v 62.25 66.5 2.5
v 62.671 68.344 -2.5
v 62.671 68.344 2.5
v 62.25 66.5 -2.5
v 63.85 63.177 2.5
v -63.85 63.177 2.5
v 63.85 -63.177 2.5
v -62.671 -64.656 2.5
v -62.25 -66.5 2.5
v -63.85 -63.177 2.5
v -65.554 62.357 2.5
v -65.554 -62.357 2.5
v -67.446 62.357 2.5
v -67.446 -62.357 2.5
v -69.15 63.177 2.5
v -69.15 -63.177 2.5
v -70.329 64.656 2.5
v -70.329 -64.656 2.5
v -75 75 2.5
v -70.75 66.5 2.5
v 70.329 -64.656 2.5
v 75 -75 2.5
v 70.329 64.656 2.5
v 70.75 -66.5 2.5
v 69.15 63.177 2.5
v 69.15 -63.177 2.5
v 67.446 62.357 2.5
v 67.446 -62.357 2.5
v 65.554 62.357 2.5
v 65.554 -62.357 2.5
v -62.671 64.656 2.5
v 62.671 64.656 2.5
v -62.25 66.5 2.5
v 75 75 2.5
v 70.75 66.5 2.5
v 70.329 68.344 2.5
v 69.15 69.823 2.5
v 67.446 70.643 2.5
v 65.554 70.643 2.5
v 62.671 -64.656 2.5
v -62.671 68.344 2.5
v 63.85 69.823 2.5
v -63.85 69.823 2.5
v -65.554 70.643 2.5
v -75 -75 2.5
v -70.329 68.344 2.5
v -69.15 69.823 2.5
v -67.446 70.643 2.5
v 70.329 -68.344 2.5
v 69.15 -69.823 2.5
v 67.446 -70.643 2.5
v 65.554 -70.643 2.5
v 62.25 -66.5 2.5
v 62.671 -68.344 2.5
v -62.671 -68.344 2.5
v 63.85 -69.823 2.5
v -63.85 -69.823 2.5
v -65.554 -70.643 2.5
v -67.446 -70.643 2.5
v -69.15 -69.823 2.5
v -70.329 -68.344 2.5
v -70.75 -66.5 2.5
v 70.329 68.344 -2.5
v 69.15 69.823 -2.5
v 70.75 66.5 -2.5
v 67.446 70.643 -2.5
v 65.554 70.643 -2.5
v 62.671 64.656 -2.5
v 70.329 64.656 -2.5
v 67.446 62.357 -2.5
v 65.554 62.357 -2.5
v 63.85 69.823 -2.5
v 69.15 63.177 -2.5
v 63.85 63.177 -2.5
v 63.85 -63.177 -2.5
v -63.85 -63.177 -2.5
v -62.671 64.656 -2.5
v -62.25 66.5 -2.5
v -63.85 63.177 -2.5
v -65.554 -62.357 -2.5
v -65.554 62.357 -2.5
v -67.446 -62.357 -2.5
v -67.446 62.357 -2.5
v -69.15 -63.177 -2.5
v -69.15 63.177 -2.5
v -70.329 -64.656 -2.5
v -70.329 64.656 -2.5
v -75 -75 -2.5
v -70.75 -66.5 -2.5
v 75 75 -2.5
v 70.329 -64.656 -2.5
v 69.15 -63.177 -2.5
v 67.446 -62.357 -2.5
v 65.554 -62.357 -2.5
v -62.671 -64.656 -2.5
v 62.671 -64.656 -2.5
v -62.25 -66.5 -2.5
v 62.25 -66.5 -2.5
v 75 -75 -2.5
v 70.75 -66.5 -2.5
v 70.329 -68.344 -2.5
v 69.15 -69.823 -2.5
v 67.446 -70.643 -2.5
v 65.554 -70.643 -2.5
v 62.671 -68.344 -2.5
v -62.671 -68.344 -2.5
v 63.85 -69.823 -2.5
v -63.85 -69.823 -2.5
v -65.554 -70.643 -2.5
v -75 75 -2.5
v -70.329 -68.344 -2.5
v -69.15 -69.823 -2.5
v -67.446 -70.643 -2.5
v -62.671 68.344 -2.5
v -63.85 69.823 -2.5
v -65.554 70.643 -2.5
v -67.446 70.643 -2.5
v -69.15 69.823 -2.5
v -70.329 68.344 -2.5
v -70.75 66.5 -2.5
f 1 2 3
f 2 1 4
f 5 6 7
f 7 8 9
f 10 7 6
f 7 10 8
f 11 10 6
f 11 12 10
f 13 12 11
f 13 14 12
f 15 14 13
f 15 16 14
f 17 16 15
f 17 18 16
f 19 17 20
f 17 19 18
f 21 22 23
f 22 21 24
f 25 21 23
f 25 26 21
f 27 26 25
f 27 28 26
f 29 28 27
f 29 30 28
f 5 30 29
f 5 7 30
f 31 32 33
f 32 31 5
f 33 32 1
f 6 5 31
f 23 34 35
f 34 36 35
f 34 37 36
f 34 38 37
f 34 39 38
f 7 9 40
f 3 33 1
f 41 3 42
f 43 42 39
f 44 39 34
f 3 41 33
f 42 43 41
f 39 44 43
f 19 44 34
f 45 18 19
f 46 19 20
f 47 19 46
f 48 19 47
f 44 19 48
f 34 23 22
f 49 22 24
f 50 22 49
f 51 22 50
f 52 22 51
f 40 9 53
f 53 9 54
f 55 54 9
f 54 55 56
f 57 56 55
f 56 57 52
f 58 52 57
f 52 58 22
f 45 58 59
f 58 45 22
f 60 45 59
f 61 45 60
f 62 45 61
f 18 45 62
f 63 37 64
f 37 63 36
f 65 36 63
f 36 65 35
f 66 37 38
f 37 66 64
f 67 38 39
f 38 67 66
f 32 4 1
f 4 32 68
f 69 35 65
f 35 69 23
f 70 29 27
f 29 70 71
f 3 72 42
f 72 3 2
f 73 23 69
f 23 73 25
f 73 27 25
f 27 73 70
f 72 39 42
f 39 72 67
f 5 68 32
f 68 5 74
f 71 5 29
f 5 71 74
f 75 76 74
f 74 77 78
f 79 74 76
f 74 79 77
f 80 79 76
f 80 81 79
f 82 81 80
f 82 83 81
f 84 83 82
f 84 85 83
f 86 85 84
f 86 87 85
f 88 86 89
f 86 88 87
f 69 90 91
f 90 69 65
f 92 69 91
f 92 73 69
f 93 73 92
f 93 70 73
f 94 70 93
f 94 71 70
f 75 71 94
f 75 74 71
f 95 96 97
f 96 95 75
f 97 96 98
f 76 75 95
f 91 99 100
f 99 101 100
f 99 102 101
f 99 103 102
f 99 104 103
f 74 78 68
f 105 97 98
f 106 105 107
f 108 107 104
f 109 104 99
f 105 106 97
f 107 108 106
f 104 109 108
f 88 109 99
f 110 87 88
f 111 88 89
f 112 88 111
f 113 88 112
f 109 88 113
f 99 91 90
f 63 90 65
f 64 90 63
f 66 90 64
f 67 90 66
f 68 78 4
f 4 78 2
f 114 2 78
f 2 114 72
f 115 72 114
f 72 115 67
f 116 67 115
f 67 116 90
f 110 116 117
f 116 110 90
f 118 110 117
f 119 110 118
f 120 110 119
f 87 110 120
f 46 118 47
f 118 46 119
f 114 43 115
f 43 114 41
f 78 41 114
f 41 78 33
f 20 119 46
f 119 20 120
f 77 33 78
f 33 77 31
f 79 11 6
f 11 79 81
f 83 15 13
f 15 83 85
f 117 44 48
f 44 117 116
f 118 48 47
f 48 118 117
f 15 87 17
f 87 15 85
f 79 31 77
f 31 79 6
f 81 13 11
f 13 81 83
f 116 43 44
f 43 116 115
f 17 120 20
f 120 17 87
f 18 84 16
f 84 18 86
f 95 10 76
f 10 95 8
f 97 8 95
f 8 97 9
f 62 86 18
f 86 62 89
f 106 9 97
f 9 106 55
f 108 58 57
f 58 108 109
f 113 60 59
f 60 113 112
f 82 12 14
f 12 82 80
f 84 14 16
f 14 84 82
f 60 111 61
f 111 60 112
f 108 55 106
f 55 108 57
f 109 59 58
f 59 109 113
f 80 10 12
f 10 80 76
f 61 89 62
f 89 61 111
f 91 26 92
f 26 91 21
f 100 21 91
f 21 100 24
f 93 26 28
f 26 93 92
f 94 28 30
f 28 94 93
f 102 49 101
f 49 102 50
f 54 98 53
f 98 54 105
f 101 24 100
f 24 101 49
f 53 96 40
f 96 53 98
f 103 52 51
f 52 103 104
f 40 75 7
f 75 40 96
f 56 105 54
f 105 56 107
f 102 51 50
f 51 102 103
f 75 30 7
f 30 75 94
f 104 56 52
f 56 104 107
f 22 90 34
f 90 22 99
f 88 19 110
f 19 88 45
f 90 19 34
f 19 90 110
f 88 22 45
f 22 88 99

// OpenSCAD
// Generated by SolidPython 1.1.3 on 2024-01-11 20:37:03


difference() {
	cube(center = true, size = [150, 150, 5]);
	union() {
		translate(v = [66.5000000000, 66.5000000000]) {
			cylinder(center = true, h = 5, r = 4.2500000000);
		}
		translate(v = [-66.5000000000, 66.5000000000]) {
			cylinder(center = true, h = 5, r = 4.2500000000);
		}
		translate(v = [-66.5000000000, -66.5000000000]) {
			cylinder(center = true, h = 5, r = 4.2500000000);
		}
		translate(v = [66.5000000000, -66.5000000000]) {
			cylinder(center = true, h = 5, r = 4.2500000000);
		}
	}
}
/***********************************************
*********      SolidPython code:      **********
************************************************
 
import solid
import numpy as np
import numbers
import pudb
from solid.utils import *
import viewscad
import subprocess
import os
import os.path as osp
import math
import sys

chamfer_extrude=solid.import_scad("./chamfer_extrude.scad")
chamfer_extrude=chamfer_extrude.chamfer_extrude
r = viewscad.Renderer(width=800, height=800)

def debug(model,f_name,path="/home/ts/code/projects/mfd/designs/debug"):
    solid.scad_render_to_file(model,osp.join(path,f_name)+".scad")
#generate position list of wells using offset from center
wells_pos_from_center_4 = lambda offset: [[-offset,offset],
                                        [offset, offset],
                                        [-offset, -offset],
                                        [offset, -offset]]
wells_pos_from_center_2 = lambda offset: [[offset,0],
                                        [-offset,0]]

def make_well(dims,shape=None,height=None,dxf=False):
    def circle_cylinder():
        if dxf or (height is None):
            well = solid.circle(r=dims, segments=64)
        else:
            well = solid.cylinder(r=dims, h=height, segments=64, center = True)
        return well
    if dims is None:
        sys.exit("radius needs to be a number")
    if isinstance(dims, numbers.Number):
        well =circle_cylinder()
    elif len(dims)==1:
        if isinstance(dims[1], numbers.Number):
            well =circle_cylinder()
        else:
            sys.exit("radius needs to be a number")
    elif len(dims)==2:
        well = solid.square(dims,center = True)
    elif len(dims)==3:
        well = solid.cube(dims, center = True)
    return well

def wells_top_bottom(center_gap,device_dims=None,shape=None,height=None, positions = None, dxf = False,well_shape=None):
    if well_shape == None:
        well_shape = make_well(device_dims,shape=shape,height=height,dxf=dxf)
    wells = []
    if positions is None:
        offset = radius+radius/2.0
        positions = wells_pos_from_center_2(offset)
    if dxf or (height is None):
        height = 0
    for position in positions:
        if dxf:
            wells.append(solid.translate([position[0],position[1]])(well_shape))
        else:
            wells.append(solid.translate([position[0],position[1],height/2.0])(well_shape))
    return  union()(*wells)

#place wells in four corners 
def four_corner(radius,height=None, positions = None, dxf = False):
    #if well pos not specified set
    #to equally spaced by half radius
    if positions is None:
        offset = radius+radius/2.0
        positions = wells_pos_from_center_4(offset)
    if dxf or (height is None):
        height = 0
    #make wells at positions with specified radius and height
    wells = []
    for position in positions:
        #make circle if making dxf
        if dxf:
            well_shape = solid.circle(r=radius, segments=64)
            well_shape = solid.translate([position[0],position[1]])(well_shape)
        #if stl make cylinder
        else:
            well_shape = solid.cylinder(r=radius, h=height, segments=64, center = True)
            well_shape = solid.translate([position[0],position[1],height/2.0])(well_shape)
        wells.append(well_shape)
    return  union()(*wells)

#generate channels 
def make_channels(length,width,height=0,num_chans=1,max_chans=None,spacing=None, dxf = False,
                  rotate_channels=False):
    if dxf or (height is None):
        height = 0
    #if channel gap not defined, is equal to
    if spacing is None: spacing = width
    #calculate number of channels if fitting max num within given width
    if not max_chans is None:
        import math
        num_chans = math.floor((max_chans-spacing)/(width+spacing))
    #get total width of channel section  
    total_width = (width*num_chans)+(spacing*(num_chans-1))

    #make template channel
    #if rotate_channels: width, length = length, width
    if dxf:
        channel_t = solid.square([length,width],center = True)
    else:
        channel_t = solid.cube([length,width,height], center = True)

    #if number channels is even, offset the first channel to center its gap
    if num_chans % 2 == 0: centering = -(width/2.0+spacing/2.0)
    else: centering = 0
    #move template channel up to align bottom at z = 0 
    #and offset center if necessary
    if dxf:
        channel_t = solid.translate([0,centering])(channel_t)
    else:
        channel_t = solid.translate([0,centering,height/2.0])(channel_t)

    #if rotate_channels: length,width = width,length
    #start making the channels
    channels = []
    for i in range(num_chans):
        #if i=0 there is no translation
        #if i=1, we make the first channel adjacent to second
        direction = i

        #if i>=1, we add channels alternating left and right
        if i >= 1:
            direction = -(i/2.0)
            if i % 2 == 1: direction = (-direction)+0.5
                
        #make channel at right position and add it to channel list
        translation_coords = [0,direction*(width+spacing)]
        #if rotate_channels: translation_coords = [direction*(width+spacing),0]
        if dxf:
            channel = solid.translate(translation_coords)(channel_t)
        else:
            channel = solid.translate([*translation_coords,0])(channel_t)
        channels.append(channel)
    
    #group all channels as one object
    channels = union()(*channels)
    #compute the x,y,z dimensions in order to pass as arguments 
    #for construction of other parts of device (such as the chambers)
    measurements = {'x':(length/2.0,-length/2.0),
                    'y':(total_width/2.0,-total_width/2.0)}
    if not dxf:
        measurements['z'] = (height,0)
    if rotate_channels:
        channels = solid.rotate(90)(channels)
        measurements['x'],measurements['y']=measurements['y'],measurements['x']
    return channels,measurements

def make_chambers(msrs,height=None,extra=0,len_until=None,width=None, dxf = False):
    #computes x,y,z length
    total = lambda x : abs(x[0]) + abs(x[1])
    
    #if specific height if specified
    #otherwise use same height as channels
    if dxf:
        pass
    elif not height is None:
        msrs['z'] = (height,0)
    else:
        msrs['z'] = (0,0)
        
    #make copy of measurements from channels to modify chamber dimensions 
    #and add length to chambers as specified
    chamber_dims = msrs.copy()
    #calculate length of chamber to reach specified offset
    if not len_until is None:
        chamber_len = len_until-(msrs['x'][0])
    #or add specified length to channel length (if not specified, adds 0)
    else:
        chamber_len = msrs['x'][0]+extra
    #set the chamber length based 
    chamber_dims['x'] = (chamber_len/2.0,-(chamber_len/2.0))
    #compute final dimensions of chamber
    if not width is None:
        chamber_dims['y'] = (width/2.0,-width/2.0)
    chamber_dims = [total(size) for size in chamber_dims.values()]
        
    #calculate chamber translation offset to place adjacent to channels
    chamber_trslt = msrs['x'][0]+(chamber_len/2.0)
    #compute chamber translation coordinates to align with channels
    #x = 1 moves chamber above channels
    #x = -1 moves chamber below channels
    if dxf:
        trslt = lambda x : [x*(chamber_trslt),0]
    else:
        trslt = lambda x : [x*(chamber_trslt),0,msrs['z'][0]/2.0]
    
    #function to make chamber at top or at bottom 
    if dxf:
        move = lambda x : solid.translate(trslt(x))(solid.square(chamber_dims, center = True) )
    else:
        move = lambda x : solid.translate(trslt(x))(solid.cube(chamber_dims,center = True))
    #make top and bottom chambers and return them as grouped
    top = move(1)
    bottom = move(-1)
    #chambers=solid.rotate(90)(solid.union()(top,bottom))
    chambers=(solid.union()(top,bottom))

    return chambers

#create alignment features 
def alignment_features(unit,dims,grid_size, mask_size = None, alignment = "hollow", units_from_center = (2.5,2.5), corner_len=None):
    width = grid_size[0]*dims[0]
    length = grid_size[1]*dims[1]
    if mask_size is None and corner_len is None:
        corner_len = (dims[0] + dims[1]) /2 / 8
    corner = lambda thickness_div : solid.union()( solid.square([corner_len,corner_len/thickness_div],center=False), solid.square([corner_len/thickness_div,corner_len],center=False) )
    
    def make_full(thickness_div):
        thickness = corner_len/thickness_div
        tr = solid.translate([0, 0, 0 ])(solid.rotate(180)(corner(thickness_div)))
        tr = solid.translate([thickness/2,thickness/2,0])(tr)
        bl = solid.translate([0, 0, 0 ])(solid.rotate(0)(corner(thickness_div)))
        bl = solid.translate([-thickness/2,-thickness/2,0])(bl)
        return solid.union()(tr,bl)
    
    def make_hollow(thickness_div):
        thickness = corner_len/(thickness_div/2)
        inner = make_full(thickness_div)
        outer = make_full(thickness_div/2)
        hollow = outer - inner 
        return hollow
    
    center = (width /2 , length/2)
    mask_pos = lambda x,y : (center[0] + x*(float(units_from_center[0])*dims[0]), center[1] + y*(float(units_from_center[1])*dims[1]))
    positions = []
    positions.append(mask_pos(1,0))
    positions.append(mask_pos(0,1))
    positions.append(mask_pos(-1,0))
    positions.append(mask_pos(0,-1))
    make_mask = lambda mtype : make_hollow(8) if mtype == "hollow" else make_full(8)
    masks = [ solid.translate([*position,0])(make_mask(alignment)) for position in positions]
    
    solid.scad_render_to_file(solid.union()(*masks),"./designs/open_chamber/masks.scad")
    #return unit - solid.union()(*masks)
    return solid.union()(*masks,unit)

def create_outline(thickness, array, dims, grid_size,):
    width = grid_size[0]*dims[0] + thickness *2
    length = grid_size[1]*dims[1] + thickness *2
    outer = solid.translate([-thickness, -thickness,0])(solid.square([width, length]))
    return outer-array

def create_wall(wall_thickness, outline_thickness, dims, grid_size, wall_height = 2000, dxf = False):
    inner_width = grid_size[0]*dims[0] + outline_thickness *2
    inner_length = grid_size[1]*dims[1] + outline_thickness *2
    outer_width = inner_width + wall_thickness * 2
    outer_length = inner_length + wall_thickness * 2
    outer_pos_x = -outline_thickness-wall_thickness
    outer_pos_y = -outline_thickness-wall_thickness
    inner_pos_x = -outline_thickness
    inner_pos_y = -outline_thickness
    if dxf:
        inner_wall = solid.translate([inner_pos_x,
                                      inner_pos_y,
                                      0])(solid.square([inner_width, inner_length]))
        outer_wall = solid.translate([outer_pos_x,
                                      outer_pos_y,
                                      0])(solid.square([outer_width, outer_length]))

        return outer_wall-inner_wall
    else:
        inner_wall = solid.translate([inner_pos_x,
                                      inner_pos_y,
                                      0])(solid.cube([inner_width, inner_length,wall_height]))
        outer_wall = solid.translate([outer_pos_x,
                                      outer_pos_y,
                                      0])(solid.cube([outer_width, outer_length,wall_height]))

        return outer_wall-inner_wall, {'wall_height': wall_height,
                                       'wall_thickness': wall_thickness,
                                       'inner_width':inner_width,
                                       'inner_length': inner_length,
                                       'outer_width': outer_width,
                                       'outer_length': outer_length,
                                       'outer_pos_x' : outer_pos_x,
                                       'outer_pos_y' : outer_pos_y,
                                       'inner_pos_x' : inner_pos_x,
                                       'inner_pos_y' : inner_pos_y}

def create_thicker_wall(wall_thickness, outer_wall_offset, wall_dims, dims, grid_size, height_start = .2, height_end=2, dxf = False):
    addon_wall,thicker_wall_dims = create_wall(wall_thickness, outer_wall_offset, dims, grid_size, wall_height=height_end-height_start, dxf = False)
    addon_wall = solid.translate([0,0,height_start])(addon_wall)

    thicker_wall_dims['wall_height'] = height_end
    thicker_wall_dims['wall_thickness'] = wall_dims['wall_thickness'] + wall_thickness
    return addon_wall, thicker_wall_dims
 
def add_lock_to_wall(wall,wall_dims,y_offset = 0,cut_ratio=0.7,L_length=3, gap_ratio=0.05, axis="x",width_ratio=1/2):
    # Makes L shape
    def make_L(max_length,length_thickness,max_width,width_thickness,height,y_offset):
        length = solid.cube([max_length,length_thickness,height])
        width = solid.cube([width_thickness,max_width,height])
        width = solid.translate([max_length-(width_thickness),0,0])(width)
        L = solid.union()(width,length)
        debug(L,"L")
        if axis == "x":
            L = solid.rotate(-90)(L)
            L = solid.translate([0,max_length,0])(L)
        else:
            L = solid.rotate(-180)(L)
            L = solid.translate([max_length,max_width,0])(L)
        return solid.translate([0,0,y_offset])(L)
    
    lock_length = L_length
    lock_width = wall_dims['wall_thickness']*width_ratio
    lock_length_thickness = lock_width/2
    lock_width_thickness = lock_width/2
    L_lock = make_L(lock_length,lock_length_thickness,lock_width,lock_width_thickness, wall_dims['wall_height']-y_offset, y_offset)
    
    margin_space = lock_length - lock_length*(1-gap_ratio)
    key_length = lock_length-margin_space
    key_length_thickness = lock_length_thickness-(margin_space*2)
    key_width = lock_width-(margin_space*2)
    key_width_thickness = lock_width_thickness-(margin_space*2)
    L_key = make_L(key_length,key_length_thickness,key_width,key_width_thickness, wall_dims['wall_height']-y_offset, y_offset)
    L_key = solid.translate([margin_space,margin_space,0])(L_key)
    L = solid.union()(L_lock,L_key)
    debug(L,"L")
    
    #Make cube to be used as negative to split frame in a half
    #Can choose if making left or right negative, specify ratio of split
    def make_negative(right,cut_ratio):
        if axis == "x":
            if right:
                length = wall_dims['outer_length']*(1-cut_ratio)
                pos_x = wall_dims['outer_pos_x']+(wall_dims['outer_length']*cut_ratio)
            else:
                length = wall_dims['outer_length']*(cut_ratio)
                pos_x = wall_dims['outer_pos_x'] 
            negative = solid.cube([wall_dims['outer_width'],length, wall_dims['wall_height']])
            negative = solid.translate([wall_dims['outer_pos_y'],pos_x,0])(negative)
        else:
            if right:
                length = wall_dims['outer_width']*(1-cut_ratio)
                pos_x = wall_dims['outer_pos_y']+(wall_dims['outer_width']*cut_ratio)
            else:
                length = wall_dims['outer_width']*(cut_ratio)
                pos_x = wall_dims['outer_pos_y'] 
            negative = solid.cube([length,wall_dims['outer_length'], wall_dims['wall_height']])
            negative = solid.translate([pos_x,wall_dims['outer_pos_x'],0])(negative)
        return negative, pos_x, length 
                      
    #Make negatives
    negative_right, right_half_pos_x, right_half_length = make_negative(True,cut_ratio)
    negative_left, left_half_pos_x, right_half_length = make_negative(False,cut_ratio)
    #Make halves
    left_half = solid.difference()(wall,negative_right)
    right_half = solid.difference()(wall,negative_left)
    def place_L(L, L_length,L_width):
        #Place L on top wall       
        offset_to_center = (wall_dims['wall_thickness']-L_width)/2
        if axis == "x":
            y_pos_top = (wall_dims['outer_pos_y'] +
                    wall_dims['outer_width'] - 
                    L_width - offset_to_center)
            top_L = solid.translate([y_pos_top,
                                     right_half_pos_x-(L_length),
                                     0])(L)
            #Place L on bottom wall       
            y_pos_bottom = wall_dims['outer_pos_y']+offset_to_center
            bottom_L = solid.translate([y_pos_bottom,
                                        right_half_pos_x-L_length,
                                        0])(L)
        else:
            y_pos_top = (wall_dims['outer_pos_x'] +
                    wall_dims['outer_length'] -
                    (L_width+offset_to_center))
            top_L = solid.translate([right_half_pos_x-L_length,
                                     y_pos_top,
                                     0])(L)
            #Place L on bottom wall       
            y_pos_bottom = wall_dims['outer_pos_y']+offset_to_center
            bottom_L = solid.translate([right_half_pos_x-L_length,
                                        y_pos_bottom,
                                        0])(L)
        return bottom_L, top_L
    #Make complimentary L pieces through union and differences
    #Make Lock
    bottom_L_lock, top_L_lock = place_L(L_lock,L_length,lock_width)
    left_half = solid.difference()(left_half,bottom_L_lock)
    left_half = solid.difference()(left_half,top_L_lock)
    #Make Key
    bottom_L_key, top_L_key = place_L(L_key,L_length,lock_width)
    right_half = solid.union()(right_half,bottom_L_key)
    right_half = solid.union()(right_half,top_L_key)
    return left_half, right_half


#build a row x col grid of containment units
def make_unit_array(unit,dims,grid_size, dxf = False, alignment = None, mask_size = None,
                    units_from_center = None,alignment_offset=None, alignment_mark_size=1):
    units = []
    for col in range(grid_size[1]):
        for row in range(grid_size[0]):
            if dxf:
                units.append(solid.translate([row*dims[0],col*dims[1]])(unit))
            else:
                units.append(solid.translate([row*dims[0],col*dims[1],dims[2]/2.0])(unit))
    array = solid.union()(*units)
    if (not alignment is None) and dxf:
        if not alignment_offset is None:
            array = solid.translate([alignment_offset[0],alignment_offset[1]])(array)
        array = alignment_features(array,dims, grid_size, alignment = alignment, mask_size = None, units_from_center = units_from_center,corner_len=alignment_mark_size)
        if not alignment_offset is None:
            array = solid.translate([-alignment_offset[0],-alignment_offset[1]])(array)
    return array


def make_taylor(wells_pos = wells_pos_from_center_4(2.25), well_rad = 1.5 ,
                well_height = 2, chan_w = 0.01, chan_l = 1, chan_h = 0.010 ,
                chan_gap = 0.040, max_chans = None,num_chans=100, chamber_height  = 0.100,
                columns = 1, rows = 1, chamber_len_until=2.25, add_channels = True, add_wells = True, 
                add_chambers = True, save_path = "./", alignment = None, units_from_center = 2,
                mask_size = None, render_stl = False, outline_thickness = 0.050, dxf = True,
                wall_height = 15, wall_thickness = 0.95, casing_x=9, casing_y=9, casing_z=0,rotate_units=0):

    dims = [casing_x, casing_y, casing_z]
    wells = four_corner(well_rad,well_height, dxf = dxf, positions = wells_pos)
    debug(wells,"wells")
    channels, msrs = make_channels(chan_l,chan_w,chan_h,dxf=dxf, spacing = chan_gap, max_chans=max_chans,num_chans=num_chans)
    debug(channels,"channels")
    chambers = make_chambers(msrs,dxf = dxf, height=chamber_height,len_until=chamber_len_until)
    debug(chambers,"chambers")

    #add together and render
    device_parts = []
    if add_channels:
        device_parts.append(channels)
    if add_wells:
        device_parts.append(wells)
    if add_chambers:
        device_parts.append(chambers)
    device=union()(*device_parts)
    device = rotate(rotate_units)(device)

    device=solid.translate([dims[0]/2.0,dims[1]/2.0,0])(device)
    channels = rotate(rotate_units)(channels)
    channels=solid.translate([dims[0]/2,dims[1]/2,0])(channels)
    chambers_wells = union()(wells,chambers)
    chambers_wells = rotate(rotate_units)(chambers_wells)
    chambers_wells=solid.translate([dims[0]/2,dims[1]/2,0])(chambers_wells)

    file_name = str(rows)+'x'+str(columns)+'_units_'
    grid_size = [rows,columns]

    if alignment:
        alignment="full"
    device = make_unit_array(device,dims,grid_size, dxf=dxf, alignment = alignment,
                                 units_from_center = units_from_center)
    channels = make_unit_array(channels,dims,grid_size, dxf=dxf, alignment = alignment,
                                 units_from_center = units_from_center)
    if alignment=="full":
        alignment="hollow"

    chambers_wells = make_unit_array(chambers_wells,dims,grid_size, dxf=dxf, alignment = alignment,
                                 units_from_center =units_from_center)

    def save_model(model,prefix):
        model_fname = os.path.abspath(save_path+prefix+"_"+file_name+".scad")
        solid.scad_render_to_file(model,model_fname)
        return model_fname

    wells_fname = save_model(wells,"wells")
    channels_fname = save_model(channels,"channels")
    device_fname = save_model(device,"device")
    chambers_wells_fname = save_model(chambers_wells,"chambers_wells")
    return (chambers_wells,chambers_wells_fname), (channels,channels_fname), (device,device_fname)

def make_device(design='open',rows=8,columns=6,wells_pos = 4.5,well_offset=3.2, well_rad=3.2,well_height=0.1,
                chan_l=1,chan_w=0.01,chan_h=0.01,chan_gap=0.015,num_chans=101,dxf=True,save_path="./designs/open_chamber/",
                casing_x=9.0,casing_y=18.0,casing_z=0,rotate_units=90,units_from_center=(3,1),chamber_len_until=4.5,
                chamber_width=None,alignment=True, add_wells=True, add_channels=True,add_chambers=True,well_shape=None):

    dims = [casing_x, casing_y, casing_z]
    if design == "open":
        wells_pos=wells_pos_from_center_2(wells_pos)
        wells = wells_top_bottom(well_offset*2,device_dims=well_rad,height=well_height, dxf = dxf, positions = wells_pos,well_shape=well_shape)
    elif design == "closed":
        wells_pos=wells_pos_from_center_4(wells_pos)
        debug(wells,"wells")
        wells = four_corner(well_offset,well_height,device_dims=well_rad, dxf = dxf, positions = wells_pos)
    else:
        print(design+" is not a valid design.\n Choose valid design: 'open' or 'closed'")
        exit()
    wells = rotate(rotate_units)(wells)
    wells=solid.translate([dims[0]/2,dims[1]/2,0])(wells)
    debug(wells,"wells")

    channels, msrs = make_channels(chan_l,chan_w,chan_h,dxf=dxf, spacing = chan_gap, num_chans=num_chans,rotate_channels=False)
    channels = rotate(rotate_units)(channels)
    channels=solid.translate([dims[0]/2,dims[1]/2,0])(channels)

    chambers=make_chambers(msrs,height=None,extra=0,len_until=chamber_len_until, width=chamber_width,dxf = dxf)
    chambers = rotate(rotate_units)(chambers)
    chambers=solid.translate([dims[0]/2,dims[1]/2,0])(chambers)

    device_parts = []
    if add_channels:
        device_parts.append(channels)
    if add_wells:
        device_parts.append(wells)
    if add_chambers:
        device_parts.append(chambers)
    device = union()(*device_parts)
    #device = rotate(rotate_units)(device)
    #device=solid.translate([dims[0]/2.0,dims[1]/2.0,0])(device)

    chambers_wells = []
    if add_chambers:
        chambers_wells.append(chambers)
    if add_wells:
        chambers_wells.append(wells)
    chambers_wells = union()(*chambers_wells)
    #chambers_wells = union()(wells,chambers)
    #chambers_wells = rotate(rotate_units)(chambers_wells)
    #chambers_wells=solid.translate([dims[0]/2,dims[1]/2,0])(chambers_wells)

    file_name = str(rows)+'x'+str(columns)+'_units_'

    grid_size = [rows,columns]
    if alignment:
        alignment="full"
    device = make_unit_array(device,dims,grid_size, dxf=dxf, alignment = alignment,
                                 units_from_center = units_from_center)
    channels = make_unit_array(channels,dims,grid_size, dxf=dxf, alignment = alignment,
                                 units_from_center = units_from_center)
    if alignment=="full":
        alignment="hollow"

    chambers_wells = make_unit_array(chambers_wells,dims,grid_size, dxf=dxf, alignment = alignment,
                                 units_from_center =units_from_center)

    def save_model(model,prefix):
        model_fname = os.path.abspath(save_path+prefix+"_"+file_name+".scad")
        solid.scad_render_to_file(model,model_fname)
        return model_fname

    wells_fname = save_model(wells,"wells")
    channels_fname = save_model(channels,"channels")
    device_fname = save_model(device,"device")
    chambers_wells_fname = save_model(chambers_wells,"chambers_wells")
    return (chambers_wells,chambers_wells_fname), (channels,channels_fname), (device,device_fname)


def make_open_chamber(rows=8,columns=6,wells_pos = wells_pos_from_center_2(4.5), well_rad=3.2,well_height=0.1,
                      chan_l=1,chan_w=0.01,chan_h=0.01,chan_gap=0.015,num_chans=101,dxf=True,save_path="./designs/open_chamber/",
                      casing_x=9.0,casing_y=18.0,casing_z=0,rotate_units=90,units_from_center=(3,1),chamber_len_until=4.5,
                      chamber_width=None,alignment=True, add_wells=True, add_channels=True,add_chambers=True,well_shape=None):

    dims = [casing_x, casing_y, casing_z]
    wells = wells_top_bottom(well_rad,height=well_height, dxf = dxf, positions = wells_pos, well_shape=well_shape)
    channels, msrs = make_channels(chan_l,chan_w,chan_h,dxf=dxf, spacing = chan_gap, num_chans=num_chans,rotate_channels=False)
    chambers=make_chambers(msrs,height=None,extra=0,len_until=chamber_len_until, width=chamber_width,dxf = dxf)
    debug(chambers,"chambers")
    device_parts = []
    if add_channels:
        device_parts.append(channels)
    if add_wells:
        device_parts.append(wells)
    if add_chambers:
        device_parts.append(chambers)
    device = union()(*device_parts)
    device = rotate(rotate_units)(device)
    device=solid.translate([dims[0]/2.0,dims[1]/2.0,0])(device)
    channels = rotate(rotate_units)(channels)
    channels=solid.translate([dims[0]/2,dims[1]/2,0])(channels)
    chambers_wells = union()(wells,chambers)
    chambers_wells = rotate(rotate_units)(chambers_wells)
    chambers_wells=solid.translate([dims[0]/2,dims[1]/2,0])(chambers_wells)

    file_name = str(rows)+'x'+str(columns)+'_units_'

    grid_size = [rows,columns]
    if alignment:
        alignment="full"
    device = make_unit_array(device,dims,grid_size, dxf=dxf, alignment = alignment,
                                 units_from_center = units_from_center)
    channels = make_unit_array(channels,dims,grid_size, dxf=dxf, alignment = alignment,
                                 units_from_center = units_from_center)
    if alignment=="full":
        alignment="hollow"

    chambers_wells = make_unit_array(chambers_wells,dims,grid_size, dxf=dxf, alignment = alignment,
                                 units_from_center =units_from_center)

    def save_model(model,prefix):
        model_fname = os.path.abspath(save_path+prefix+"_"+file_name+".scad")
        solid.scad_render_to_file(model,model_fname)
        return model_fname

    wells_fname = save_model(wells,"wells")
    channels_fname = save_model(channels,"channels")
    device_fname = save_model(device,"device")
    chambers_wells_fname = save_model(chambers_wells,"chambers_wells")
    return (chambers_wells,chambers_wells_fname), (channels,channels_fname), (device,device_fname)

def to_dxf(scad_path):
    dxf_path = scad_path.replace(".scad",".dxf")
    subprocess.call(["openscad", "-o", dxf_path, scad_path])
    import ezdxf
    temp_dxf = ezdxf.readfile(dxf_path)
    temp_dxf.saveas(dxf_path)

#def make_walls(diameter,thickness,grid_size,dims,height=20,segments=256,make_inner=True):
#    wafer_wall_out = solid.cylinder(r=diameter/2,h=height, segments=segments)
#    wafer_wall_in = solid.cylinder(r=(diameter/2-thickness),h=height, segments=segments)
#    wafer_wall = solid.difference()(wafer_wall_out,wafer_wall_in)
#    wafer_wall = solid.translate([grid_size[1]*dims[1]/2.0,grid_size[0]*dims[0]/2.0])(wafer_wall)
#
#    vertical_wall_length = grid_size[1]*dims[1]
#    horizontal_wall_length = grid_size[0]*dims[0]
#    vertical_wall = solid.cube([vertical_wall_length,thickness,height],center = True)
#    vertical_wall = solid.translate([vertical_wall_length/2,0,height/2])(vertical_wall)
#    horizontal_wall = solid.cube([thickness,horizontal_wall_length,height],center = True)
#    horizontal_wall = solid.translate([0,vertical_wall_length/2,height/2])(horizontal_wall)
#    walls = []
#    walls.append(horizontal_wall)
#    walls.append(vertical_wall)
#    for col in range(grid_size[1]):
#        if col == grid_size[1]-1: 
#            walls.append(solid.translate([0,(col+1)*dims[1]])(vertical_wall))
#        elif col > 0 and col < grid_size[1]-1 and make_inner==True:
#            walls.append(solid.translate([0,(col+1)*dims[1]])(vertical_wall))
#    for row in range(grid_size[0]):
#        if row == grid_size[0]-1: 
#            walls.append(solid.translate([(row+1)*dims[0],0])(horizontal_wall))
#        elif row > 0 and row < grid_size[0]-1 and make_inner==True:
#            walls.append(solid.translate([(row+1)*dims[0],0])(horizontal_wall))
#    walls = union()(*walls)
#    wafer_walls = union()(walls,wafer_wall)
#    return walls,wafer_wall,wafer_walls

def make_walls(diameter,thickness,grid_size,dims,height=20,segments=256,make_inner=True,padx=0,pady=0):
    wafer_wall_out = solid.cylinder(r=diameter/2,h=height, segments=segments)
    wafer_wall_in = solid.cylinder(r=(diameter/2-thickness),h=height, segments=segments)
    wafer_wall = solid.difference()(wafer_wall_out,wafer_wall_in)
    wafer_wall = solid.translate([grid_size[1]*dims[1]/2.0,grid_size[0]*dims[0]/2.0])(wafer_wall)

    vertical_wall_length = grid_size[0]*dims[0]+padx
    horizontal_wall_length = grid_size[1]*dims[1]+pady
    vertical_wall = solid.cube([vertical_wall_length,thickness,height],center = True)
    vertical_wall = solid.translate([vertical_wall_length/2-pady/2,-padx/2,height/2])(vertical_wall)
    horizontal_wall = solid.cube([thickness,horizontal_wall_length,height],center = True)
    horizontal_wall = solid.translate([-pady/2,horizontal_wall_length/2-padx/2,height/2])(horizontal_wall)
    walls = []
    walls.append(horizontal_wall)
    walls.append(vertical_wall)
    for col in range(grid_size[1]):
        if col == grid_size[1]-1: 
            walls.append(solid.translate([0,(col+1)*dims[1]+pady])(vertical_wall))
        elif col > 0 and col < grid_size[1]-1 and make_inner==True:
            walls.append(solid.translate([0,(col+1)*dims[1]])(vertical_wall))
    for row in range(grid_size[0]):
        if row == grid_size[0]-1: 
            walls.append(solid.translate([(row+1)*dims[0]+padx,0])(horizontal_wall))
        elif row > 0 and row < grid_size[0]-1 and make_inner==True:
            walls.append(solid.translate([(row+1)*dims[0],0])(horizontal_wall))
    walls = union()(*walls)
    wafer_walls = union()(walls,wafer_wall)
    return walls,wafer_wall,wafer_walls

def save_model(model,base_path,base_name,dxf=True):
    if not os.path.exists(base_path):
        os.makedirs(base_path)
    dxf_path=osp.join(base_path,base_name+".scad")
    solid.scad_render_to_file(model,osp.join(dxf_path))
    if dxf:
        to_dxf(dxf_path)

def make_wafer(diameter,flat_len,thickness):
    wafer = solid.cylinder(r1=diameter/2,r2=diameter/2,h=thickness,segments=512,)()
    x_start_flat=(flat_len/2)
    y_start_flat = math.sqrt(((diameter/2)**2) - (x_start_flat**2) )
    height_delete_flat=diameter/2-y_start_flat
    flat_delete = solid.cube([flat_len,height_delete_flat,thickness],center=False)()
    flat_delete = solid.translate([-flat_len/2,y_start_flat,0])(flat_delete)
    wafer = solid.difference()(wafer,flat_delete)
    wafer = solid.rotate(90)(wafer)
    return wafer

def add_wafer_to_mask(wafer_size,flat_len,mask,grid_size,dims,wafer_line_thickness=0.1,outer_mask_thickness=5,alignment_offset=None):
    def make_wafer_mask(wafer_size,flat_len):
        wafer_mask = make_wafer(wafer_size,flat_len,1)
        wafer_mask = solid.projection()(wafer_mask)
        wafer_mask = solid.translate([grid_size[0]*dims[0]/2.0,grid_size[1]*dims[1]/2.0])(wafer_mask)
        if not alignment_offset is None:
            wafer_mask = solid.translate([-alignment_offset[0],-alignment_offset[1]])(wafer_mask)
        return wafer_mask

    inner_wafer_line_mask = make_wafer_mask(wafer_size-wafer_line_thickness/2,flat_len)
    outer_wafer_line_mask = make_wafer_mask(wafer_size+wafer_line_thickness/2,flat_len)
    outer_wafer_mask = make_wafer_mask(wafer_size+outer_mask_thickness,flat_len)
    outer_wafer_mask = solid.difference()(outer_wafer_mask,outer_wafer_line_mask)
    wafer_mask = solid.union()(outer_wafer_mask,inner_wafer_line_mask)

    return solid.difference()(wafer_mask,mask)

def make_posts(post_shape,post_height):
    posts = solid.linear_extrude(height=post_height)(post_shape)
    return posts

def make_wafer_empty(diameter,flat_len,thickness,margin,notch_len=20,notch_height=5,oversize=1.01):
    diameter*=oversize
    flat_len*=oversize
    wafer = make_wafer(diameter,flat_len,thickness)
    holder = solid.cylinder(r1=diameter/2+margin,r2=diameter/2+margin,h=thickness,segments=512)()
    holder = solid.difference()(holder,wafer)

    x_start_flat=(flat_len/2)
    y_start_flat = math.sqrt(((diameter/2)**2) - (x_start_flat**2) )
    height_delete_flat=diameter/2-y_start_flat
    notch = solid.cube([notch_len,notch_height,thickness],center=False)()
    notch = solid.translate([-notch_len/2,y_start_flat,0])(notch)
    notch = solid.rotate(90)(notch)
    return solid.difference()(holder,notch)

def wafer_print_calibration(diameter,thickness,height,z_offset):
    circles = []
    radii = []
    radii.append(diameter/2.0*0.8)
    radii.append(diameter/2.0*0.6)
    radii.append(diameter/2.0*0.4)
    radii.append(diameter/2.0*0.2)
    for radius in radii:
        inner = solid.cylinder(r1=radius-(thickness/2.0),r2=radius-(thickness/2.0),h=thickness,segments=512,)()
        outer = solid.cylinder(r1=radius+(thickness/2.0),r2=radius+(thickness/2.0),h=thickness,segments=512,)()
        diff = solid.difference()(outer,inner)
        circles.append(diff)
    circles = solid.union()(*circles)
    circles = solid.translate([0,0,z_offset])(circles)
    return circles

def make_rack(wells,dims,grid_size,alignment_offset,rack_x,rack_y,rack_thickness,bolt_width,add_bolts=True):

    #get X and Y dimensions of gride of pipette tips
    X_len = dims[0]*grid_size[0]
    Y_len = dims[1]*grid_size[1]
    #make rack
    rack = solid.cube([rack_x,rack_y,rack_thickness],center=True)

    if add_bolts:
    #add bolt holes
        bolt_hole=solid.cylinder(r=bolt_width/2,h=rack_thickness,center=True)()
        bolt_holes = []
        bolt_holes.append(solid.translate([rack_x/2-1.5*bolt_width,rack_y/2-1.5*bolt_width])(bolt_hole))
        bolt_holes.append(solid.translate([-rack_x/2+1.5*bolt_width,rack_y/2-1.5*bolt_width])(bolt_hole))
        bolt_holes.append(solid.translate([-rack_x/2+1.5*bolt_width,-rack_y/2+1.5*bolt_width])(bolt_hole))
        bolt_holes.append(solid.translate([rack_x/2-1.5*bolt_width,-rack_y/2+1.5*bolt_width])(bolt_hole))
        bolt_holes = solid.union()(*bolt_holes)
        rack=solid.difference()(rack,bolt_holes)
    rack_support = rack

    #center rack with pipette holes
    rack = solid.translate([0,0,rack_thickness/2])(rack)
    rack = solid.translate([X_len/2,Y_len/2])(rack)
    rack = solid.translate([-alignment_offset[0],-alignment_offset[1]])(rack)
    wells = solid.linear_extrude(height=rack_thickness)(wells)
    rack = solid.difference()(rack,wells)
    return rack, rack_support

def make_pillar(wells,dims,grid_size,alignment_offset,rack_x,rack_y,pillar_height,rack_thickness,bolt_width,add_bolts=True,taper_angle=1,bolt_position_corner=1.5):

    #get X and Y dimensions of gride of pipette tips
    X_len = dims[0]*grid_size[0]
    Y_len = dims[1]*grid_size[1]
    #make rack
    rack = solid.cube([rack_x,rack_y,rack_thickness],center=True)
    
    if add_bolts:
    #add bolt holes
        bolt_hole=solid.cylinder(r=bolt_width/2,h=rack_thickness,center=True)()
        bolt_holes = []
        bolt_holes.append(solid.translate([rack_x/2-bolt_position_corner*bolt_width,rack_y/2-bolt_position_corner*bolt_width])(bolt_hole))
        bolt_holes.append(solid.translate([-rack_x/2+bolt_position_corner*bolt_width,rack_y/2-bolt_position_corner*bolt_width])(bolt_hole))
        bolt_holes.append(solid.translate([-rack_x/2+bolt_position_corner*bolt_width,-rack_y/2+bolt_position_corner*bolt_width])(bolt_hole))
        bolt_holes.append(solid.translate([rack_x/2-bolt_position_corner*bolt_width,-rack_y/2+bolt_position_corner*bolt_width])(bolt_hole))
        bolt_holes = solid.union()(*bolt_holes)
        rack=solid.difference()(rack,bolt_holes)
    rack_support = rack

    #center rack with pipette holes
    #rack = solid.translate([0,0,-rack_thickness])(rack)
    rack = solid.translate([X_len/2,Y_len/2])(rack)
    rack = solid.translate([-alignment_offset[0],-alignment_offset[1]])(rack)
    if not taper_angle == 0:
        wells=chamfer_extrude(pillar_height,taper_angle,segments=20)(wells)
    else:
        wells = solid.linear_extrude(height=pillar_height)(wells)
    rack = solid.union()(rack,wells)
    return rack, rack_support

def deg_taper_len(height,deg):
    if not deg == 0:
        return height*math.tan(math.radians(deg))
    else:
        return 0

def make_outline(inner_dims,wall_thickness,grid_size,dims,alignment_offset):
    inner_dims=np.array(inner_dims)
    inner_outline=solid.square(inner_dims,center=True)
    outer_dims=inner_dims+wall_thickness
    outer_outline=solid.square(outer_dims,center=True)
    outline=solid.difference()(outer_outline,inner_outline)
    outline=solid.translate([grid_size[0]*dims[0]/2.0,grid_size[1]*dims[1]/2.0])(outline)
    return outline








 
 
************************************************/
